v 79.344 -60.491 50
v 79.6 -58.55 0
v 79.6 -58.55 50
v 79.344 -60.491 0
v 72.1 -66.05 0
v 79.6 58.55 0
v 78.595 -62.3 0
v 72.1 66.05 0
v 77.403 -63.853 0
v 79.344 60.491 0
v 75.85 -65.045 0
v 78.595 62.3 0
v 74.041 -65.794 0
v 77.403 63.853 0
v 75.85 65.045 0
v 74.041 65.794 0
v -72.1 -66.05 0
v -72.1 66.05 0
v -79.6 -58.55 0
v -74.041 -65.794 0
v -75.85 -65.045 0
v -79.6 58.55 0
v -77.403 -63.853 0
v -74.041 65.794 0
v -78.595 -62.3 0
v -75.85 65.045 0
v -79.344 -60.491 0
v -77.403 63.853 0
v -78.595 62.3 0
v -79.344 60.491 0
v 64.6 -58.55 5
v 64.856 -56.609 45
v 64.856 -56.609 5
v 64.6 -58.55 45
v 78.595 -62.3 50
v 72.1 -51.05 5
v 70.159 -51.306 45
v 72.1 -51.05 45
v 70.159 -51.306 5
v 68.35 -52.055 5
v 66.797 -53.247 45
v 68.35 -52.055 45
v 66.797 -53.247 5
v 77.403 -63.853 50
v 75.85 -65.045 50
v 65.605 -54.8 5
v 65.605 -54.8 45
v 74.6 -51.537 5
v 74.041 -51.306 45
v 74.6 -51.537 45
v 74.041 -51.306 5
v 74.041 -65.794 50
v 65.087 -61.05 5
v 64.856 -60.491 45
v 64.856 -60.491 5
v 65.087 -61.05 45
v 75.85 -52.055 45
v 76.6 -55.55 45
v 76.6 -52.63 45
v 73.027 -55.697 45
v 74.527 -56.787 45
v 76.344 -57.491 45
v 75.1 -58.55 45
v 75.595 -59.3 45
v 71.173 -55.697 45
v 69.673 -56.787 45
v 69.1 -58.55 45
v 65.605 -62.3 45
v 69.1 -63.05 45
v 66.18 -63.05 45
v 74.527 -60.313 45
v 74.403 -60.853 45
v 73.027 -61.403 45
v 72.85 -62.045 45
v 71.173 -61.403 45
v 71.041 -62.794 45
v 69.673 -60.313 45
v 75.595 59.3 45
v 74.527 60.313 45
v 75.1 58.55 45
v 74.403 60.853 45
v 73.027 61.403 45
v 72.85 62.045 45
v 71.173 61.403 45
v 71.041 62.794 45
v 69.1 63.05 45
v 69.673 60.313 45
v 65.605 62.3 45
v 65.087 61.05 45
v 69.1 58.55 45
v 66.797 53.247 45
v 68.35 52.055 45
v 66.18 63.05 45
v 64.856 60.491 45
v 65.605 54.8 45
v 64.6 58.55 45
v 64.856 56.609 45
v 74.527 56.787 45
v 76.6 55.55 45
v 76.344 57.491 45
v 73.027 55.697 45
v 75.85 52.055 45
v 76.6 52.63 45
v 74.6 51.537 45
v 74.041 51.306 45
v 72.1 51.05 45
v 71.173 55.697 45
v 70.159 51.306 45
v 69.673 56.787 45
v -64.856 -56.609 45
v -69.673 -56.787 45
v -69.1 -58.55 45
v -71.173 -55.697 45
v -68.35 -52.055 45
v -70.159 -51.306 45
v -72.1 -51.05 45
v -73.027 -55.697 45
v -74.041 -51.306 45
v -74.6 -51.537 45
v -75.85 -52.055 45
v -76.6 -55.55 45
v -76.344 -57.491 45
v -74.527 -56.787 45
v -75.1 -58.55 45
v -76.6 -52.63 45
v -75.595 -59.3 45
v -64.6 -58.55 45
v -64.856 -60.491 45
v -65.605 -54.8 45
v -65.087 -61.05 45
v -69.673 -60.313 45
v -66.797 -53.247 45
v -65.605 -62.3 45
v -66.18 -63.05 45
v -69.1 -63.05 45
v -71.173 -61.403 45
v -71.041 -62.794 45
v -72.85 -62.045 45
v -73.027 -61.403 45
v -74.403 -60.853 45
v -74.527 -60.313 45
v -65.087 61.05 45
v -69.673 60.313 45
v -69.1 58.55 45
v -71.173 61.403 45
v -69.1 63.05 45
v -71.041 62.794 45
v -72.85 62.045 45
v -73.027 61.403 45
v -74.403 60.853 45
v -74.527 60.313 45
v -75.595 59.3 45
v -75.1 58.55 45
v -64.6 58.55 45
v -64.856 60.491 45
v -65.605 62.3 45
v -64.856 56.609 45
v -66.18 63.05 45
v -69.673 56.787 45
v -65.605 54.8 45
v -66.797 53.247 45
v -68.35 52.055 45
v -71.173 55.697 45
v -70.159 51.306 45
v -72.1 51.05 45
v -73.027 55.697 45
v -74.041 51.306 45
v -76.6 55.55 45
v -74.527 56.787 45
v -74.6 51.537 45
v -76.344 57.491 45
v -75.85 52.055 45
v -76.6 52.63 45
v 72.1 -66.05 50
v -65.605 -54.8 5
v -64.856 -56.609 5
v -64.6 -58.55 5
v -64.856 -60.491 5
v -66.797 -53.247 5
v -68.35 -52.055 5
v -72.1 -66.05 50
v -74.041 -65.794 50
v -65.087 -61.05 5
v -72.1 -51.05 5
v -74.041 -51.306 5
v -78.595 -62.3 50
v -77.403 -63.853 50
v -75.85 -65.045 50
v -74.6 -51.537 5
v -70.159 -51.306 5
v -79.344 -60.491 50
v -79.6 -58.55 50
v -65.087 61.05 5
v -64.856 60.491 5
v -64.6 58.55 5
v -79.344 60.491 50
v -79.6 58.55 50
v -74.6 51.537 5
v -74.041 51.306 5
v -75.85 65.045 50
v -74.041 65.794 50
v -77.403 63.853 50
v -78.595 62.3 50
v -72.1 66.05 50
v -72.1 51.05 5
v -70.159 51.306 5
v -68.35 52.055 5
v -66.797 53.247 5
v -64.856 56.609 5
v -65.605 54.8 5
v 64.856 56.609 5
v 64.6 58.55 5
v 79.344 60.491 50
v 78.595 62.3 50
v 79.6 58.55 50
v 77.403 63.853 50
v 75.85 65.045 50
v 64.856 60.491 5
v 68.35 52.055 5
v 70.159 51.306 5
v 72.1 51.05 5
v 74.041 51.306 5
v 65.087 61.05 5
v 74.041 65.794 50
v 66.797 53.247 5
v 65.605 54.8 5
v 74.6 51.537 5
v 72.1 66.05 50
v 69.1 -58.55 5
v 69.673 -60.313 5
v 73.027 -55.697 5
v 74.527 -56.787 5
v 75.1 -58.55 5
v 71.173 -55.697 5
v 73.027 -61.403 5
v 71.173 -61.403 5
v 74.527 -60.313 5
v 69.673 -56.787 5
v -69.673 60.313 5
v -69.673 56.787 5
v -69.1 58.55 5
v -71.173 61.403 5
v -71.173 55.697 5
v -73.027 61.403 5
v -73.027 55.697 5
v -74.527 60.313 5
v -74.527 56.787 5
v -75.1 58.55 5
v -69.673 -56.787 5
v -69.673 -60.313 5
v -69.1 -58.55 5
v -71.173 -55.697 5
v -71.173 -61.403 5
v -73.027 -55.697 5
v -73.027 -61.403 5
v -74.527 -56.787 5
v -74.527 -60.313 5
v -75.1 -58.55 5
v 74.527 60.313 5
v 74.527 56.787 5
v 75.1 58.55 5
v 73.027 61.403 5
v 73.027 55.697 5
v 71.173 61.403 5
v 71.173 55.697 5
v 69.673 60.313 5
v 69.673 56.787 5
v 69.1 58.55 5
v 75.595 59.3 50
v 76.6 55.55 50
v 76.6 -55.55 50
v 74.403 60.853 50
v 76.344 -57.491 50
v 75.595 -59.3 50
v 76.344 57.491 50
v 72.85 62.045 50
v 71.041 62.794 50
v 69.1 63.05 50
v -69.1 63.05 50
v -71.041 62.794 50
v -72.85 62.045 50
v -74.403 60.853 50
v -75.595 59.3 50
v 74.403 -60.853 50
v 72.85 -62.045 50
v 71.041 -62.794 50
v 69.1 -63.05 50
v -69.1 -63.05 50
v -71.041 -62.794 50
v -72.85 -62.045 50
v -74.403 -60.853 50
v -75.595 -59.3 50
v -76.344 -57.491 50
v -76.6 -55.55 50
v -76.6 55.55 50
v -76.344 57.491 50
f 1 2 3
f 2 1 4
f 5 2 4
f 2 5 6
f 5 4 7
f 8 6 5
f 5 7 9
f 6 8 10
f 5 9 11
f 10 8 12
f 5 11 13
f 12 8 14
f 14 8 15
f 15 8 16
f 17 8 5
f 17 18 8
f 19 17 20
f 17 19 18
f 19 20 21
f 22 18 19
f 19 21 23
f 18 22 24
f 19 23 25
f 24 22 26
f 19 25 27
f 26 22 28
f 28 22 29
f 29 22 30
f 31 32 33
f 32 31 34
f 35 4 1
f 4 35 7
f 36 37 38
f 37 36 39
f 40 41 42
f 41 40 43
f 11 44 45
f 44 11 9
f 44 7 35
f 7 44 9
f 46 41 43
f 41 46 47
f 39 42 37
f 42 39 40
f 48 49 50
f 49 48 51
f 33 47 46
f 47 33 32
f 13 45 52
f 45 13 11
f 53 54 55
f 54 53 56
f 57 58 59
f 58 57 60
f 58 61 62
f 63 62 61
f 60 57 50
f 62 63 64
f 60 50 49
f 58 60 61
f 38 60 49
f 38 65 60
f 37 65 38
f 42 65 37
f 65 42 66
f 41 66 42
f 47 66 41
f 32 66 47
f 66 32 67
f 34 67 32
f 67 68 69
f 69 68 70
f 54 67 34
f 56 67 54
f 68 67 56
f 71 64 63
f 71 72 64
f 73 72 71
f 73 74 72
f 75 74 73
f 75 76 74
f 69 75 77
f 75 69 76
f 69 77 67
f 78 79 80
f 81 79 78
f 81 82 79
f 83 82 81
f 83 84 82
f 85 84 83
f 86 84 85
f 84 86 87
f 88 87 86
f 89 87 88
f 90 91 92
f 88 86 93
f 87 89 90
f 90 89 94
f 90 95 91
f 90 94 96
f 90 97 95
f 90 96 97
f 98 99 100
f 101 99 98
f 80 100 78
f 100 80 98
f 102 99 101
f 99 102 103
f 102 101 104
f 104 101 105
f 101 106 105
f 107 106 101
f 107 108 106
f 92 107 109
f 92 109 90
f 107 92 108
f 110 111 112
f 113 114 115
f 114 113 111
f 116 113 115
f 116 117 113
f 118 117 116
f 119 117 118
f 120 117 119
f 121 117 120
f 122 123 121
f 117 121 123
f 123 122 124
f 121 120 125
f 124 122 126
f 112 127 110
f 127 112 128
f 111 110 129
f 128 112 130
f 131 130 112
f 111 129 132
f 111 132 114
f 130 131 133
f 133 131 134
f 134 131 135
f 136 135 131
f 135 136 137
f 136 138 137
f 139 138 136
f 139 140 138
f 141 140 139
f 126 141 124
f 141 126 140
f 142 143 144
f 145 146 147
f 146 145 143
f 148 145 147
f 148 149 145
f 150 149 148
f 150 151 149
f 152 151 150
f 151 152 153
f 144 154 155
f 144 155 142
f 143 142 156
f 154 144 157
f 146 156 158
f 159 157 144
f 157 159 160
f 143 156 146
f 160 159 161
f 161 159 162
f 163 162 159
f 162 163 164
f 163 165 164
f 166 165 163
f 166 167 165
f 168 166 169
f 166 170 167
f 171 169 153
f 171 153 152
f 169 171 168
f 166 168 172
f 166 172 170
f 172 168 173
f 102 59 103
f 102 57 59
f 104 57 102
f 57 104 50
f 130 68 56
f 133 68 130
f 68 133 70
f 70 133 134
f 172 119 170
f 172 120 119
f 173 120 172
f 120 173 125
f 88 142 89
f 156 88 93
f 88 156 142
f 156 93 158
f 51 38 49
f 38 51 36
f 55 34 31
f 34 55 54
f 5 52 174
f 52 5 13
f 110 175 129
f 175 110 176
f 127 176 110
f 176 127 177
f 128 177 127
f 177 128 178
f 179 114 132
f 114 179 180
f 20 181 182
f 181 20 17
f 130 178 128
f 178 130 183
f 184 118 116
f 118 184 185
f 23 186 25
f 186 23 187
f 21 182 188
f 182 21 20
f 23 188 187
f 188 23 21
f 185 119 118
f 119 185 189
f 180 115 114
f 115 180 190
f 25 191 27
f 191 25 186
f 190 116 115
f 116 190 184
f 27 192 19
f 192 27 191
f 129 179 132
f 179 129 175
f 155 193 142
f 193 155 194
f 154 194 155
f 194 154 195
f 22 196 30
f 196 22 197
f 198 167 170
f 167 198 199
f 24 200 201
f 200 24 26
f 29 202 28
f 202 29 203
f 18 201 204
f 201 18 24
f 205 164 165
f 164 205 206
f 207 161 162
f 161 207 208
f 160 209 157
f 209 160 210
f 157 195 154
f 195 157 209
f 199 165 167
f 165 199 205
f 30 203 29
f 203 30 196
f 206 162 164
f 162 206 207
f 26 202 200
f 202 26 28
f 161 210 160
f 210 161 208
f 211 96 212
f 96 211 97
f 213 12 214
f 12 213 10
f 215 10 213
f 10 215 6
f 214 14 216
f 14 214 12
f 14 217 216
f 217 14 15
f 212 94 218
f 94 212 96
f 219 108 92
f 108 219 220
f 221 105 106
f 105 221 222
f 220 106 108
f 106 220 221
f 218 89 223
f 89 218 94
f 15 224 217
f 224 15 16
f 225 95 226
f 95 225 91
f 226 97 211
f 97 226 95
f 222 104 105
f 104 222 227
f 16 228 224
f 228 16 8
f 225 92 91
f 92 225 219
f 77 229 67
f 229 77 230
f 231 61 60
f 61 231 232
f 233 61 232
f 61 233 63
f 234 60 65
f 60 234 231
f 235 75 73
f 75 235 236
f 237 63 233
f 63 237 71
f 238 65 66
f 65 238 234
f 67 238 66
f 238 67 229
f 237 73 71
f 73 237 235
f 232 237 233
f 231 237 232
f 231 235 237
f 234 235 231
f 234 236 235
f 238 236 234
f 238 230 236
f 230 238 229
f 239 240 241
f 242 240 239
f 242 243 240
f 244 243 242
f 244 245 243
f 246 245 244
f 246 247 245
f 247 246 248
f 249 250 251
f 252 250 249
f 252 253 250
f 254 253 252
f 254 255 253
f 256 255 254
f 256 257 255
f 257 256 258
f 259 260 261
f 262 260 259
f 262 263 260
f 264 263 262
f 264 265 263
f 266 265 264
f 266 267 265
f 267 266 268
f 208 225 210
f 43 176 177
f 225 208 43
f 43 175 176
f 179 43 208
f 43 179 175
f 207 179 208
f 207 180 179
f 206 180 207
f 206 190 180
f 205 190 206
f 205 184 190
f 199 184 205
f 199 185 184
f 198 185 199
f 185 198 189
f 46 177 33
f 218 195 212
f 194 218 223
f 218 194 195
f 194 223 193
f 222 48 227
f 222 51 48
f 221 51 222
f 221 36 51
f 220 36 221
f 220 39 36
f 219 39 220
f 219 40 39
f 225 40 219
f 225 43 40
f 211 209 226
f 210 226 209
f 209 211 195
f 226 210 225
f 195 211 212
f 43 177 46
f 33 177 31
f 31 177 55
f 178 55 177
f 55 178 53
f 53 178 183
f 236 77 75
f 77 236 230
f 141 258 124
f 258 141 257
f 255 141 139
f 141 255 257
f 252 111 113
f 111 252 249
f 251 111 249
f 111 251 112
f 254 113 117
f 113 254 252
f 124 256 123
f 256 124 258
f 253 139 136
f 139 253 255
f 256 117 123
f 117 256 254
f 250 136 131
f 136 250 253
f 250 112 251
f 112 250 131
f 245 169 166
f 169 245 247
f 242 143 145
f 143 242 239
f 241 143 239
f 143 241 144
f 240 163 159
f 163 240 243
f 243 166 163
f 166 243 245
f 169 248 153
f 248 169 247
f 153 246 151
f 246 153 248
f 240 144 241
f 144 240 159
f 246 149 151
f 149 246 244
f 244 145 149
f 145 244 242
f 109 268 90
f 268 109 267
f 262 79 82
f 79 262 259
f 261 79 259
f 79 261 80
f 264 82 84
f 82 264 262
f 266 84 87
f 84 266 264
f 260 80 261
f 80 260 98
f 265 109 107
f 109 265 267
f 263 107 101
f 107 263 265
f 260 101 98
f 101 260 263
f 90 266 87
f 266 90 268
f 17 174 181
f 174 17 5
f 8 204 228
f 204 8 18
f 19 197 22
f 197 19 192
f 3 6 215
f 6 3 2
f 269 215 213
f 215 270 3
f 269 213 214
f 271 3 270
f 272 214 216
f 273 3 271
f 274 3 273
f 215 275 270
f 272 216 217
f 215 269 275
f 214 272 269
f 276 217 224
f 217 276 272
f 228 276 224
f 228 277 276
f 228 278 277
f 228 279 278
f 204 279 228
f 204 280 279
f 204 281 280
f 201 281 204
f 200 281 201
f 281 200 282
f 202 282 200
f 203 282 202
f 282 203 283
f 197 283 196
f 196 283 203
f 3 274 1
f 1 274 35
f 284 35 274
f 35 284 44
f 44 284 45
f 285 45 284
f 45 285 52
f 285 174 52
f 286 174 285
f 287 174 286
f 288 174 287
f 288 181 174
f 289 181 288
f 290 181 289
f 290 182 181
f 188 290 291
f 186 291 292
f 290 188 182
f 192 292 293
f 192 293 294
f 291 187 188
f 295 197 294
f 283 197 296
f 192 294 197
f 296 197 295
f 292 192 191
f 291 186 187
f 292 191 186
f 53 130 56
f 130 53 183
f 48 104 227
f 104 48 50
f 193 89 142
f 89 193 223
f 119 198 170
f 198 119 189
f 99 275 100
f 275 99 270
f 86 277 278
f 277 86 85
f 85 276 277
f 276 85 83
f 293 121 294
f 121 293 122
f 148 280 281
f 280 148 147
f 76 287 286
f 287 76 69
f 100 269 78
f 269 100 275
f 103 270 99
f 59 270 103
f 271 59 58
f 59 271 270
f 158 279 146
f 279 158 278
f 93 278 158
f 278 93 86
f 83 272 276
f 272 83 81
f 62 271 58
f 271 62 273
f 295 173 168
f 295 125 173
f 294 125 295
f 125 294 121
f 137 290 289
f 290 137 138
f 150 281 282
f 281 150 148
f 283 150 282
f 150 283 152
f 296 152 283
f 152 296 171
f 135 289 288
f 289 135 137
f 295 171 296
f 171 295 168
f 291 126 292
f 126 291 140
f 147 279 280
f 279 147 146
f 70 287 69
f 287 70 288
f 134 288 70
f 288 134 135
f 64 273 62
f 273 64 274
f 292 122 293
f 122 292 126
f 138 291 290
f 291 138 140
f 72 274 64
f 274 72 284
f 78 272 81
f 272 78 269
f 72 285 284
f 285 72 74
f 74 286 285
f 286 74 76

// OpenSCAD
keypad_x = 69.2;
keypad_y = 76.9;
keypad_z = 2;
keypad_radius = 10;

lcd_x = 60;
lcd_y = 25.2;
lcd_z = 2;
lcd_holex_x = 75;
lcd_holes_y = 31;

rfid_s = 41;

space = 30;
box_x = keypad_x + lcd_x + space;
box_y = keypad_y + lcd_y + space;
box_z =  50;
wall_thickness = 5;
radius = 7.5;
lid_thickness = 5;
lid_lip = 3;
lid_bottom = box_z - lid_thickness;


module posts (x,y,z,h,r) {
			translate([x, -y , z])
			cylinder(h=h,r=r);
			translate([-x, -y , z])
			cylinder(h=h,r=r);
			translate([-x, y ,z])
			cylinder(h=h,r=r);
			translate([x, y ,z])
			cylinder(h=h,r=r);
}

module postsHoles () {
	posts(
		x=(box_x /2) -radius,
		y=(box_y /2) -radius,
		z=wall_thickness,
		h=box_z,
		r=3
	);
}



module box (x,y,z,h,r, hull = false) {
	hull() { posts(x,y,z,h,r);}
}

module boxLid () {
	box(
			x=(box_x /2) -radius - lid_lip,
			y=(box_y /2) -radius - lid_lip,
			z= lid_bottom,
			h= lid_thickness,
			r= radius
			);
}


//box
union () {

//posts
	difference() {
		posts(
			x=(box_x /2) -radius ,
			y=(box_y /2) -radius ,
			z=0,
			h=lid_bottom,
			r=radius
		);
		postsHoles();
	}
	
	difference(){	
		box(
			x=(box_x /2) -radius,
			y=(box_y /2) -radius, 
			z=0,
			h=box_z,
			r=radius
			);

		box(
			x=(box_x /2)-radius - wall_thickness,
			y=(box_y /2 )-radius - wall_thickness, 
			z=wall_thickness,
			h=box_z,
			r=radius
			);
		boxLid(); 	//lip cut
		postsHoles();
	}


}





//    <  lcd   >
// --------------
// --          -- ^
// --          -- 
// -------------- v
// --          -- 
// --          -- ^
// --          -- 
// --          -- v
// --------------
//    < keypad  >

// lid
*union() {
	difference() {
		boxLid();
		postsHoles();
		//lcd cut
		translate([lcd_x / 2 + space / 2, 0, box_z - wall_thickness])
		rotate(90)
		cube([ lcd_x, lcd_y, box_z ], center = true);
		//lcd holes
		translate([lcd_x / 2 + space / 2, 0, 0])
		rotate(90)
		posts(
			x =  lcd_holex_x / 2,
			y = lcd_holes_y /2 ,
			z = lid_bottom,
			h = box_z + 1,
			r = 2.5
		);
		//keypad cut
		translate([-space + 5, 0, 0])
		box(
			x = keypad_x / 2,
			y = keypad_y / 2,
			z = lid_bottom + lid_thickness - keypad_z + 0.1,
			r = keypad_radius,
			h= keypad_z
		);
		//keypad cable cut
		translate([-keypad_x,0,lid_bottom])
		cube([3,15,15], center=true);
	}

	// posts for rfid interior mount
		mount_posts_h = 6;
		translate([-(keypad_x / 2), 0,lid_bottom - mount_posts_h])
	difference() {
		posts(
				x=(rfid_s / 2),
				y=(rfid_s / 2),
				z=0,
				h=mount_posts_h,
				r=mount_posts_h
		);
		posts(
				x=(rfid_s / 2),
				y=(rfid_s / 2),
				z=0,
				h=mount_posts_h,
				r=3

		);
	}
}
